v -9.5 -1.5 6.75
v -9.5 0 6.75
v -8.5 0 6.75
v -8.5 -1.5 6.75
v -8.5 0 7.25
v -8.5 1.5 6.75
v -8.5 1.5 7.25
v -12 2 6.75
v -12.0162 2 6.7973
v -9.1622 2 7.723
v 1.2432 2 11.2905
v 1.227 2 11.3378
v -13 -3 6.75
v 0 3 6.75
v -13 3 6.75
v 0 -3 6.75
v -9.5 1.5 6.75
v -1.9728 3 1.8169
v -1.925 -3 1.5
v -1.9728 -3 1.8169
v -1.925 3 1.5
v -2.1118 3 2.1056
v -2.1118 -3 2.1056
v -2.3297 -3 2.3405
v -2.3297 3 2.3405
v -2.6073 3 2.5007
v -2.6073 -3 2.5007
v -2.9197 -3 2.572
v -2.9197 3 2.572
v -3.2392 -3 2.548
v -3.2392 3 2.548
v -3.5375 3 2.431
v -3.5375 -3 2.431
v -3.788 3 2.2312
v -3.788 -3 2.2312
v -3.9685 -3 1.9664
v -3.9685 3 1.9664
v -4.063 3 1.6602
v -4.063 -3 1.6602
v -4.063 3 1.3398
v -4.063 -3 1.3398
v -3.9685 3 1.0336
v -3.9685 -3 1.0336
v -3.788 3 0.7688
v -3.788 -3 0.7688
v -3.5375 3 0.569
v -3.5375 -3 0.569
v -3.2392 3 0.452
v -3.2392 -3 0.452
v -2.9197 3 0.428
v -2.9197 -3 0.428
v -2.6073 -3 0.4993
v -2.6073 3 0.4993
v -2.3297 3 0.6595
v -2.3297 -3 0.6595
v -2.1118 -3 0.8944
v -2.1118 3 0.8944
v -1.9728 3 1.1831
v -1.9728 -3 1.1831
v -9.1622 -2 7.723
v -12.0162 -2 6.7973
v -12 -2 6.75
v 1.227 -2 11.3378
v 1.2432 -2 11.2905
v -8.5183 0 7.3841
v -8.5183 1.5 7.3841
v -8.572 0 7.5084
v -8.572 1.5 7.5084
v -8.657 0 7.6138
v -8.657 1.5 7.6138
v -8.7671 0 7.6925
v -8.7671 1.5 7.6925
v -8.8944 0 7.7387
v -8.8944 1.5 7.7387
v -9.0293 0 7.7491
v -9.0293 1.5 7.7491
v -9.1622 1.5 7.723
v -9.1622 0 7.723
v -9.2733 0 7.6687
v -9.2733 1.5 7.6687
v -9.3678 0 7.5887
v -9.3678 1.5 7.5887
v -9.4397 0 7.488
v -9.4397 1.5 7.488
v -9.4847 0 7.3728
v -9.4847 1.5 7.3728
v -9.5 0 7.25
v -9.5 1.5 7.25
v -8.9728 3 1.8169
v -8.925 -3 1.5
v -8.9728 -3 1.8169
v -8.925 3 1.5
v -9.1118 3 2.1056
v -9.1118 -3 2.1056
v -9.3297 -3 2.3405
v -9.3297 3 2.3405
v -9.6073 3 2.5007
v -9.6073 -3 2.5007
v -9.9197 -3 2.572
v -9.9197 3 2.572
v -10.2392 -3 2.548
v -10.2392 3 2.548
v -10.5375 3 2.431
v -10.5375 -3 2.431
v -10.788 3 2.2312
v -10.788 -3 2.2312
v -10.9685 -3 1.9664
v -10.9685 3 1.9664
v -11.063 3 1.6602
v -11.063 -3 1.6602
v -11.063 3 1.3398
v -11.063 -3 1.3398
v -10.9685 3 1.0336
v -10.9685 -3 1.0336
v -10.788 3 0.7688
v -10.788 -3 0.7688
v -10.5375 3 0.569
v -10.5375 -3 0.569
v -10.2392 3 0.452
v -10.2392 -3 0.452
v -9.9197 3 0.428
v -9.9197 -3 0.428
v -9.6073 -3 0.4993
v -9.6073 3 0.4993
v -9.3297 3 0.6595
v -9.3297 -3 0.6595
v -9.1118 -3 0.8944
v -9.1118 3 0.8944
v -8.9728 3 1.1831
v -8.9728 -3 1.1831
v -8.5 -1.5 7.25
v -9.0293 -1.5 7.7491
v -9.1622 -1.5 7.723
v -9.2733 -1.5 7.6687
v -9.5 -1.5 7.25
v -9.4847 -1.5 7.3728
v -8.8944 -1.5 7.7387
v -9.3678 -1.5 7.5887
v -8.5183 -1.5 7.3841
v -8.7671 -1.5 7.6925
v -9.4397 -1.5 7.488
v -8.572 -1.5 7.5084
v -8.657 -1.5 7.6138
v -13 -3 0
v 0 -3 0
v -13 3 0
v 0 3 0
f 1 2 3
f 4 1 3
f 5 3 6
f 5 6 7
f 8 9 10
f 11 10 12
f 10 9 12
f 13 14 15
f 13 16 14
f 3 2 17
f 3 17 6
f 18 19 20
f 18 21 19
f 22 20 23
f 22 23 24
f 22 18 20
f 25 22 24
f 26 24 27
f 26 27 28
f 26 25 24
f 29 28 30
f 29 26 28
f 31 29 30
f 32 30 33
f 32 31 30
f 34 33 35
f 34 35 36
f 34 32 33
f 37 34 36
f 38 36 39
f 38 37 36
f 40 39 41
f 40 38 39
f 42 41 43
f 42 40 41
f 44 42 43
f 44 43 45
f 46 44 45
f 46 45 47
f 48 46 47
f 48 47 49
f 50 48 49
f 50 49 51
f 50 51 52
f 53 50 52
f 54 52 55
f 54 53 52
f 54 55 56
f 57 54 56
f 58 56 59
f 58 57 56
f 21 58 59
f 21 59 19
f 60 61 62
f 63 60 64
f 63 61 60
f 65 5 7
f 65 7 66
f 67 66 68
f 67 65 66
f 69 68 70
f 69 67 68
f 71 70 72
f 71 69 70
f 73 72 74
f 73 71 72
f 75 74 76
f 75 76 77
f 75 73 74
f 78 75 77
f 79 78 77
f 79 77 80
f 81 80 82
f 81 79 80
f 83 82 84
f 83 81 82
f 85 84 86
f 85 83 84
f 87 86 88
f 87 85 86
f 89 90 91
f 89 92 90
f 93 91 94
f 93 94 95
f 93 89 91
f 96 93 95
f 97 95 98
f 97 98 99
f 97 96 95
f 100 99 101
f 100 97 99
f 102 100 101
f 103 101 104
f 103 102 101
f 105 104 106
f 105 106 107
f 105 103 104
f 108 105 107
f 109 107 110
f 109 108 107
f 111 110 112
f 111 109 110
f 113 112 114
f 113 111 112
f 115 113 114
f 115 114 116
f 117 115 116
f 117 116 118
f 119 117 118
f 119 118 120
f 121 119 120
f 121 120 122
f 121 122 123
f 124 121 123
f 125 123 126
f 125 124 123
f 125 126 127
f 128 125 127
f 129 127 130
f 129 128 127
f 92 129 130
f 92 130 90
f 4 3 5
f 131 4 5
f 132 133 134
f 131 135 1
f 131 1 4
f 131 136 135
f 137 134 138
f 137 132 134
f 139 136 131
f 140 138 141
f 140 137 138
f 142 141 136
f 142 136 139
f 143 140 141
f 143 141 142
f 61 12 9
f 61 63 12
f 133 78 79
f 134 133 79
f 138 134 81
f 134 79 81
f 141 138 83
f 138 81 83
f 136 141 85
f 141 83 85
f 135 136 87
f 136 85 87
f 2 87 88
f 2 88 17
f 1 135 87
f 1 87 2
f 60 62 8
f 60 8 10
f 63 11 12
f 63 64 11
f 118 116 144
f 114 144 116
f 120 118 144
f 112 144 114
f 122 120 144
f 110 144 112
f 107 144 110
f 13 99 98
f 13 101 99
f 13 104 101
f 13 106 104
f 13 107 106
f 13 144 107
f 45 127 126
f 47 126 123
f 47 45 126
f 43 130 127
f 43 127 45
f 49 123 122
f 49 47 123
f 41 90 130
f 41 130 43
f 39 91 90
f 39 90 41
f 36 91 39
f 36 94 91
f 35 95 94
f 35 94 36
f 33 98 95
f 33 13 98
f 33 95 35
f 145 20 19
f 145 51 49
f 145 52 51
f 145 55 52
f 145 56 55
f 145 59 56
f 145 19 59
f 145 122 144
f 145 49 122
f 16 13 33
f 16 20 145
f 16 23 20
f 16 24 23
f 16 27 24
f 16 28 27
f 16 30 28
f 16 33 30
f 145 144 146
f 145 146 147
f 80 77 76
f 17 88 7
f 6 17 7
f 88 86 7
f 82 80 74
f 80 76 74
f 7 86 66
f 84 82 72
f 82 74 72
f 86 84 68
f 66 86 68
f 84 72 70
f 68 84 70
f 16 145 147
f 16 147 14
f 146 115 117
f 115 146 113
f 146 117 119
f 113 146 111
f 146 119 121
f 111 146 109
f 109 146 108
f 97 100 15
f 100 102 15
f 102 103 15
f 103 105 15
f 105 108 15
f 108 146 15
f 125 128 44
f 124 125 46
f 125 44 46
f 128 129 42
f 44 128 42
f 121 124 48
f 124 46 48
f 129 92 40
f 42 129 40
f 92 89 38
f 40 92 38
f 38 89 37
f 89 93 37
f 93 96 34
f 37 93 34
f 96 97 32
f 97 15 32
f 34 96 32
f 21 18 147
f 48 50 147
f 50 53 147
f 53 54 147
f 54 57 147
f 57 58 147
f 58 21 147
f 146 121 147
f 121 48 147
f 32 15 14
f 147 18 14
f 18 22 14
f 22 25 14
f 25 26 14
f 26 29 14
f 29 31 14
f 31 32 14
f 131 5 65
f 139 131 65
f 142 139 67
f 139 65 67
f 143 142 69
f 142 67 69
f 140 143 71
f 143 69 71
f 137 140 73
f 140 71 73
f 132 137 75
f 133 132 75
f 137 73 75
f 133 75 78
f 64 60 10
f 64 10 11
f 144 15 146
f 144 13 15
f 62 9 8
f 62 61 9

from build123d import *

# Parameters (mm, degrees)
F0_R     = 1.075
F1_DEPTH = 3
F2_DEPTH = 1.5
F3_DEPTH = 2


with BuildPart() as f1:
    # F0 (on Front) → F1 (new body, symmetric)
    with BuildSketch(Plane.XZ):
        Polygon((-12, 6.75), (-13, 6.75), (-13, 0), (0, 0), (0, 6.75), (-8.5, 6.75), (-9.5, 6.75), align=None)
        with Locations((-10, 1.5)):
            Circle(F0_R, mode=Mode.SUBTRACT)
        with Locations((-3, 1.5)):
            Circle(F0_R, mode=Mode.SUBTRACT)
    extrude(amount=F1_DEPTH, both=True)


with BuildPart() as f2:
    # F0 (on Front) → F2 (new body, symmetric)
    with BuildSketch(Plane.XZ):
        with BuildLine():
            Line((-9.5, 7.25), (-9.5, 6.75))
            Line((-9.5, 6.75), (-8.5, 6.75))
            Line((-8.5, 6.75), (-8.5, 7.25))
            ThreePointArc((-8.5, 7.25), (-8.7093808918, 7.6568667275), (-9.1621621359, 7.722972982))
            ThreePointArc((-9.1621621359, 7.722972982), (-9.4068667275, 7.5406191082), (-9.5, 7.25))
        make_face()
    extrude(amount=F2_DEPTH, both=True)


with BuildPart() as f3:
    # F0 (on Front) → F3 (new body, symmetric)
    with BuildSketch(Plane.XZ):
        Polygon((-12.0162162162, 6.7972972973), (-12, 6.75), (-9.1621621359, 7.722972982), (1.2432432432, 11.2905405405), (1.227027027, 11.3378378378), align=None)
    extrude(amount=F3_DEPTH, both=True)


solid = Compound([f1.part, f2.part, f3.part])
